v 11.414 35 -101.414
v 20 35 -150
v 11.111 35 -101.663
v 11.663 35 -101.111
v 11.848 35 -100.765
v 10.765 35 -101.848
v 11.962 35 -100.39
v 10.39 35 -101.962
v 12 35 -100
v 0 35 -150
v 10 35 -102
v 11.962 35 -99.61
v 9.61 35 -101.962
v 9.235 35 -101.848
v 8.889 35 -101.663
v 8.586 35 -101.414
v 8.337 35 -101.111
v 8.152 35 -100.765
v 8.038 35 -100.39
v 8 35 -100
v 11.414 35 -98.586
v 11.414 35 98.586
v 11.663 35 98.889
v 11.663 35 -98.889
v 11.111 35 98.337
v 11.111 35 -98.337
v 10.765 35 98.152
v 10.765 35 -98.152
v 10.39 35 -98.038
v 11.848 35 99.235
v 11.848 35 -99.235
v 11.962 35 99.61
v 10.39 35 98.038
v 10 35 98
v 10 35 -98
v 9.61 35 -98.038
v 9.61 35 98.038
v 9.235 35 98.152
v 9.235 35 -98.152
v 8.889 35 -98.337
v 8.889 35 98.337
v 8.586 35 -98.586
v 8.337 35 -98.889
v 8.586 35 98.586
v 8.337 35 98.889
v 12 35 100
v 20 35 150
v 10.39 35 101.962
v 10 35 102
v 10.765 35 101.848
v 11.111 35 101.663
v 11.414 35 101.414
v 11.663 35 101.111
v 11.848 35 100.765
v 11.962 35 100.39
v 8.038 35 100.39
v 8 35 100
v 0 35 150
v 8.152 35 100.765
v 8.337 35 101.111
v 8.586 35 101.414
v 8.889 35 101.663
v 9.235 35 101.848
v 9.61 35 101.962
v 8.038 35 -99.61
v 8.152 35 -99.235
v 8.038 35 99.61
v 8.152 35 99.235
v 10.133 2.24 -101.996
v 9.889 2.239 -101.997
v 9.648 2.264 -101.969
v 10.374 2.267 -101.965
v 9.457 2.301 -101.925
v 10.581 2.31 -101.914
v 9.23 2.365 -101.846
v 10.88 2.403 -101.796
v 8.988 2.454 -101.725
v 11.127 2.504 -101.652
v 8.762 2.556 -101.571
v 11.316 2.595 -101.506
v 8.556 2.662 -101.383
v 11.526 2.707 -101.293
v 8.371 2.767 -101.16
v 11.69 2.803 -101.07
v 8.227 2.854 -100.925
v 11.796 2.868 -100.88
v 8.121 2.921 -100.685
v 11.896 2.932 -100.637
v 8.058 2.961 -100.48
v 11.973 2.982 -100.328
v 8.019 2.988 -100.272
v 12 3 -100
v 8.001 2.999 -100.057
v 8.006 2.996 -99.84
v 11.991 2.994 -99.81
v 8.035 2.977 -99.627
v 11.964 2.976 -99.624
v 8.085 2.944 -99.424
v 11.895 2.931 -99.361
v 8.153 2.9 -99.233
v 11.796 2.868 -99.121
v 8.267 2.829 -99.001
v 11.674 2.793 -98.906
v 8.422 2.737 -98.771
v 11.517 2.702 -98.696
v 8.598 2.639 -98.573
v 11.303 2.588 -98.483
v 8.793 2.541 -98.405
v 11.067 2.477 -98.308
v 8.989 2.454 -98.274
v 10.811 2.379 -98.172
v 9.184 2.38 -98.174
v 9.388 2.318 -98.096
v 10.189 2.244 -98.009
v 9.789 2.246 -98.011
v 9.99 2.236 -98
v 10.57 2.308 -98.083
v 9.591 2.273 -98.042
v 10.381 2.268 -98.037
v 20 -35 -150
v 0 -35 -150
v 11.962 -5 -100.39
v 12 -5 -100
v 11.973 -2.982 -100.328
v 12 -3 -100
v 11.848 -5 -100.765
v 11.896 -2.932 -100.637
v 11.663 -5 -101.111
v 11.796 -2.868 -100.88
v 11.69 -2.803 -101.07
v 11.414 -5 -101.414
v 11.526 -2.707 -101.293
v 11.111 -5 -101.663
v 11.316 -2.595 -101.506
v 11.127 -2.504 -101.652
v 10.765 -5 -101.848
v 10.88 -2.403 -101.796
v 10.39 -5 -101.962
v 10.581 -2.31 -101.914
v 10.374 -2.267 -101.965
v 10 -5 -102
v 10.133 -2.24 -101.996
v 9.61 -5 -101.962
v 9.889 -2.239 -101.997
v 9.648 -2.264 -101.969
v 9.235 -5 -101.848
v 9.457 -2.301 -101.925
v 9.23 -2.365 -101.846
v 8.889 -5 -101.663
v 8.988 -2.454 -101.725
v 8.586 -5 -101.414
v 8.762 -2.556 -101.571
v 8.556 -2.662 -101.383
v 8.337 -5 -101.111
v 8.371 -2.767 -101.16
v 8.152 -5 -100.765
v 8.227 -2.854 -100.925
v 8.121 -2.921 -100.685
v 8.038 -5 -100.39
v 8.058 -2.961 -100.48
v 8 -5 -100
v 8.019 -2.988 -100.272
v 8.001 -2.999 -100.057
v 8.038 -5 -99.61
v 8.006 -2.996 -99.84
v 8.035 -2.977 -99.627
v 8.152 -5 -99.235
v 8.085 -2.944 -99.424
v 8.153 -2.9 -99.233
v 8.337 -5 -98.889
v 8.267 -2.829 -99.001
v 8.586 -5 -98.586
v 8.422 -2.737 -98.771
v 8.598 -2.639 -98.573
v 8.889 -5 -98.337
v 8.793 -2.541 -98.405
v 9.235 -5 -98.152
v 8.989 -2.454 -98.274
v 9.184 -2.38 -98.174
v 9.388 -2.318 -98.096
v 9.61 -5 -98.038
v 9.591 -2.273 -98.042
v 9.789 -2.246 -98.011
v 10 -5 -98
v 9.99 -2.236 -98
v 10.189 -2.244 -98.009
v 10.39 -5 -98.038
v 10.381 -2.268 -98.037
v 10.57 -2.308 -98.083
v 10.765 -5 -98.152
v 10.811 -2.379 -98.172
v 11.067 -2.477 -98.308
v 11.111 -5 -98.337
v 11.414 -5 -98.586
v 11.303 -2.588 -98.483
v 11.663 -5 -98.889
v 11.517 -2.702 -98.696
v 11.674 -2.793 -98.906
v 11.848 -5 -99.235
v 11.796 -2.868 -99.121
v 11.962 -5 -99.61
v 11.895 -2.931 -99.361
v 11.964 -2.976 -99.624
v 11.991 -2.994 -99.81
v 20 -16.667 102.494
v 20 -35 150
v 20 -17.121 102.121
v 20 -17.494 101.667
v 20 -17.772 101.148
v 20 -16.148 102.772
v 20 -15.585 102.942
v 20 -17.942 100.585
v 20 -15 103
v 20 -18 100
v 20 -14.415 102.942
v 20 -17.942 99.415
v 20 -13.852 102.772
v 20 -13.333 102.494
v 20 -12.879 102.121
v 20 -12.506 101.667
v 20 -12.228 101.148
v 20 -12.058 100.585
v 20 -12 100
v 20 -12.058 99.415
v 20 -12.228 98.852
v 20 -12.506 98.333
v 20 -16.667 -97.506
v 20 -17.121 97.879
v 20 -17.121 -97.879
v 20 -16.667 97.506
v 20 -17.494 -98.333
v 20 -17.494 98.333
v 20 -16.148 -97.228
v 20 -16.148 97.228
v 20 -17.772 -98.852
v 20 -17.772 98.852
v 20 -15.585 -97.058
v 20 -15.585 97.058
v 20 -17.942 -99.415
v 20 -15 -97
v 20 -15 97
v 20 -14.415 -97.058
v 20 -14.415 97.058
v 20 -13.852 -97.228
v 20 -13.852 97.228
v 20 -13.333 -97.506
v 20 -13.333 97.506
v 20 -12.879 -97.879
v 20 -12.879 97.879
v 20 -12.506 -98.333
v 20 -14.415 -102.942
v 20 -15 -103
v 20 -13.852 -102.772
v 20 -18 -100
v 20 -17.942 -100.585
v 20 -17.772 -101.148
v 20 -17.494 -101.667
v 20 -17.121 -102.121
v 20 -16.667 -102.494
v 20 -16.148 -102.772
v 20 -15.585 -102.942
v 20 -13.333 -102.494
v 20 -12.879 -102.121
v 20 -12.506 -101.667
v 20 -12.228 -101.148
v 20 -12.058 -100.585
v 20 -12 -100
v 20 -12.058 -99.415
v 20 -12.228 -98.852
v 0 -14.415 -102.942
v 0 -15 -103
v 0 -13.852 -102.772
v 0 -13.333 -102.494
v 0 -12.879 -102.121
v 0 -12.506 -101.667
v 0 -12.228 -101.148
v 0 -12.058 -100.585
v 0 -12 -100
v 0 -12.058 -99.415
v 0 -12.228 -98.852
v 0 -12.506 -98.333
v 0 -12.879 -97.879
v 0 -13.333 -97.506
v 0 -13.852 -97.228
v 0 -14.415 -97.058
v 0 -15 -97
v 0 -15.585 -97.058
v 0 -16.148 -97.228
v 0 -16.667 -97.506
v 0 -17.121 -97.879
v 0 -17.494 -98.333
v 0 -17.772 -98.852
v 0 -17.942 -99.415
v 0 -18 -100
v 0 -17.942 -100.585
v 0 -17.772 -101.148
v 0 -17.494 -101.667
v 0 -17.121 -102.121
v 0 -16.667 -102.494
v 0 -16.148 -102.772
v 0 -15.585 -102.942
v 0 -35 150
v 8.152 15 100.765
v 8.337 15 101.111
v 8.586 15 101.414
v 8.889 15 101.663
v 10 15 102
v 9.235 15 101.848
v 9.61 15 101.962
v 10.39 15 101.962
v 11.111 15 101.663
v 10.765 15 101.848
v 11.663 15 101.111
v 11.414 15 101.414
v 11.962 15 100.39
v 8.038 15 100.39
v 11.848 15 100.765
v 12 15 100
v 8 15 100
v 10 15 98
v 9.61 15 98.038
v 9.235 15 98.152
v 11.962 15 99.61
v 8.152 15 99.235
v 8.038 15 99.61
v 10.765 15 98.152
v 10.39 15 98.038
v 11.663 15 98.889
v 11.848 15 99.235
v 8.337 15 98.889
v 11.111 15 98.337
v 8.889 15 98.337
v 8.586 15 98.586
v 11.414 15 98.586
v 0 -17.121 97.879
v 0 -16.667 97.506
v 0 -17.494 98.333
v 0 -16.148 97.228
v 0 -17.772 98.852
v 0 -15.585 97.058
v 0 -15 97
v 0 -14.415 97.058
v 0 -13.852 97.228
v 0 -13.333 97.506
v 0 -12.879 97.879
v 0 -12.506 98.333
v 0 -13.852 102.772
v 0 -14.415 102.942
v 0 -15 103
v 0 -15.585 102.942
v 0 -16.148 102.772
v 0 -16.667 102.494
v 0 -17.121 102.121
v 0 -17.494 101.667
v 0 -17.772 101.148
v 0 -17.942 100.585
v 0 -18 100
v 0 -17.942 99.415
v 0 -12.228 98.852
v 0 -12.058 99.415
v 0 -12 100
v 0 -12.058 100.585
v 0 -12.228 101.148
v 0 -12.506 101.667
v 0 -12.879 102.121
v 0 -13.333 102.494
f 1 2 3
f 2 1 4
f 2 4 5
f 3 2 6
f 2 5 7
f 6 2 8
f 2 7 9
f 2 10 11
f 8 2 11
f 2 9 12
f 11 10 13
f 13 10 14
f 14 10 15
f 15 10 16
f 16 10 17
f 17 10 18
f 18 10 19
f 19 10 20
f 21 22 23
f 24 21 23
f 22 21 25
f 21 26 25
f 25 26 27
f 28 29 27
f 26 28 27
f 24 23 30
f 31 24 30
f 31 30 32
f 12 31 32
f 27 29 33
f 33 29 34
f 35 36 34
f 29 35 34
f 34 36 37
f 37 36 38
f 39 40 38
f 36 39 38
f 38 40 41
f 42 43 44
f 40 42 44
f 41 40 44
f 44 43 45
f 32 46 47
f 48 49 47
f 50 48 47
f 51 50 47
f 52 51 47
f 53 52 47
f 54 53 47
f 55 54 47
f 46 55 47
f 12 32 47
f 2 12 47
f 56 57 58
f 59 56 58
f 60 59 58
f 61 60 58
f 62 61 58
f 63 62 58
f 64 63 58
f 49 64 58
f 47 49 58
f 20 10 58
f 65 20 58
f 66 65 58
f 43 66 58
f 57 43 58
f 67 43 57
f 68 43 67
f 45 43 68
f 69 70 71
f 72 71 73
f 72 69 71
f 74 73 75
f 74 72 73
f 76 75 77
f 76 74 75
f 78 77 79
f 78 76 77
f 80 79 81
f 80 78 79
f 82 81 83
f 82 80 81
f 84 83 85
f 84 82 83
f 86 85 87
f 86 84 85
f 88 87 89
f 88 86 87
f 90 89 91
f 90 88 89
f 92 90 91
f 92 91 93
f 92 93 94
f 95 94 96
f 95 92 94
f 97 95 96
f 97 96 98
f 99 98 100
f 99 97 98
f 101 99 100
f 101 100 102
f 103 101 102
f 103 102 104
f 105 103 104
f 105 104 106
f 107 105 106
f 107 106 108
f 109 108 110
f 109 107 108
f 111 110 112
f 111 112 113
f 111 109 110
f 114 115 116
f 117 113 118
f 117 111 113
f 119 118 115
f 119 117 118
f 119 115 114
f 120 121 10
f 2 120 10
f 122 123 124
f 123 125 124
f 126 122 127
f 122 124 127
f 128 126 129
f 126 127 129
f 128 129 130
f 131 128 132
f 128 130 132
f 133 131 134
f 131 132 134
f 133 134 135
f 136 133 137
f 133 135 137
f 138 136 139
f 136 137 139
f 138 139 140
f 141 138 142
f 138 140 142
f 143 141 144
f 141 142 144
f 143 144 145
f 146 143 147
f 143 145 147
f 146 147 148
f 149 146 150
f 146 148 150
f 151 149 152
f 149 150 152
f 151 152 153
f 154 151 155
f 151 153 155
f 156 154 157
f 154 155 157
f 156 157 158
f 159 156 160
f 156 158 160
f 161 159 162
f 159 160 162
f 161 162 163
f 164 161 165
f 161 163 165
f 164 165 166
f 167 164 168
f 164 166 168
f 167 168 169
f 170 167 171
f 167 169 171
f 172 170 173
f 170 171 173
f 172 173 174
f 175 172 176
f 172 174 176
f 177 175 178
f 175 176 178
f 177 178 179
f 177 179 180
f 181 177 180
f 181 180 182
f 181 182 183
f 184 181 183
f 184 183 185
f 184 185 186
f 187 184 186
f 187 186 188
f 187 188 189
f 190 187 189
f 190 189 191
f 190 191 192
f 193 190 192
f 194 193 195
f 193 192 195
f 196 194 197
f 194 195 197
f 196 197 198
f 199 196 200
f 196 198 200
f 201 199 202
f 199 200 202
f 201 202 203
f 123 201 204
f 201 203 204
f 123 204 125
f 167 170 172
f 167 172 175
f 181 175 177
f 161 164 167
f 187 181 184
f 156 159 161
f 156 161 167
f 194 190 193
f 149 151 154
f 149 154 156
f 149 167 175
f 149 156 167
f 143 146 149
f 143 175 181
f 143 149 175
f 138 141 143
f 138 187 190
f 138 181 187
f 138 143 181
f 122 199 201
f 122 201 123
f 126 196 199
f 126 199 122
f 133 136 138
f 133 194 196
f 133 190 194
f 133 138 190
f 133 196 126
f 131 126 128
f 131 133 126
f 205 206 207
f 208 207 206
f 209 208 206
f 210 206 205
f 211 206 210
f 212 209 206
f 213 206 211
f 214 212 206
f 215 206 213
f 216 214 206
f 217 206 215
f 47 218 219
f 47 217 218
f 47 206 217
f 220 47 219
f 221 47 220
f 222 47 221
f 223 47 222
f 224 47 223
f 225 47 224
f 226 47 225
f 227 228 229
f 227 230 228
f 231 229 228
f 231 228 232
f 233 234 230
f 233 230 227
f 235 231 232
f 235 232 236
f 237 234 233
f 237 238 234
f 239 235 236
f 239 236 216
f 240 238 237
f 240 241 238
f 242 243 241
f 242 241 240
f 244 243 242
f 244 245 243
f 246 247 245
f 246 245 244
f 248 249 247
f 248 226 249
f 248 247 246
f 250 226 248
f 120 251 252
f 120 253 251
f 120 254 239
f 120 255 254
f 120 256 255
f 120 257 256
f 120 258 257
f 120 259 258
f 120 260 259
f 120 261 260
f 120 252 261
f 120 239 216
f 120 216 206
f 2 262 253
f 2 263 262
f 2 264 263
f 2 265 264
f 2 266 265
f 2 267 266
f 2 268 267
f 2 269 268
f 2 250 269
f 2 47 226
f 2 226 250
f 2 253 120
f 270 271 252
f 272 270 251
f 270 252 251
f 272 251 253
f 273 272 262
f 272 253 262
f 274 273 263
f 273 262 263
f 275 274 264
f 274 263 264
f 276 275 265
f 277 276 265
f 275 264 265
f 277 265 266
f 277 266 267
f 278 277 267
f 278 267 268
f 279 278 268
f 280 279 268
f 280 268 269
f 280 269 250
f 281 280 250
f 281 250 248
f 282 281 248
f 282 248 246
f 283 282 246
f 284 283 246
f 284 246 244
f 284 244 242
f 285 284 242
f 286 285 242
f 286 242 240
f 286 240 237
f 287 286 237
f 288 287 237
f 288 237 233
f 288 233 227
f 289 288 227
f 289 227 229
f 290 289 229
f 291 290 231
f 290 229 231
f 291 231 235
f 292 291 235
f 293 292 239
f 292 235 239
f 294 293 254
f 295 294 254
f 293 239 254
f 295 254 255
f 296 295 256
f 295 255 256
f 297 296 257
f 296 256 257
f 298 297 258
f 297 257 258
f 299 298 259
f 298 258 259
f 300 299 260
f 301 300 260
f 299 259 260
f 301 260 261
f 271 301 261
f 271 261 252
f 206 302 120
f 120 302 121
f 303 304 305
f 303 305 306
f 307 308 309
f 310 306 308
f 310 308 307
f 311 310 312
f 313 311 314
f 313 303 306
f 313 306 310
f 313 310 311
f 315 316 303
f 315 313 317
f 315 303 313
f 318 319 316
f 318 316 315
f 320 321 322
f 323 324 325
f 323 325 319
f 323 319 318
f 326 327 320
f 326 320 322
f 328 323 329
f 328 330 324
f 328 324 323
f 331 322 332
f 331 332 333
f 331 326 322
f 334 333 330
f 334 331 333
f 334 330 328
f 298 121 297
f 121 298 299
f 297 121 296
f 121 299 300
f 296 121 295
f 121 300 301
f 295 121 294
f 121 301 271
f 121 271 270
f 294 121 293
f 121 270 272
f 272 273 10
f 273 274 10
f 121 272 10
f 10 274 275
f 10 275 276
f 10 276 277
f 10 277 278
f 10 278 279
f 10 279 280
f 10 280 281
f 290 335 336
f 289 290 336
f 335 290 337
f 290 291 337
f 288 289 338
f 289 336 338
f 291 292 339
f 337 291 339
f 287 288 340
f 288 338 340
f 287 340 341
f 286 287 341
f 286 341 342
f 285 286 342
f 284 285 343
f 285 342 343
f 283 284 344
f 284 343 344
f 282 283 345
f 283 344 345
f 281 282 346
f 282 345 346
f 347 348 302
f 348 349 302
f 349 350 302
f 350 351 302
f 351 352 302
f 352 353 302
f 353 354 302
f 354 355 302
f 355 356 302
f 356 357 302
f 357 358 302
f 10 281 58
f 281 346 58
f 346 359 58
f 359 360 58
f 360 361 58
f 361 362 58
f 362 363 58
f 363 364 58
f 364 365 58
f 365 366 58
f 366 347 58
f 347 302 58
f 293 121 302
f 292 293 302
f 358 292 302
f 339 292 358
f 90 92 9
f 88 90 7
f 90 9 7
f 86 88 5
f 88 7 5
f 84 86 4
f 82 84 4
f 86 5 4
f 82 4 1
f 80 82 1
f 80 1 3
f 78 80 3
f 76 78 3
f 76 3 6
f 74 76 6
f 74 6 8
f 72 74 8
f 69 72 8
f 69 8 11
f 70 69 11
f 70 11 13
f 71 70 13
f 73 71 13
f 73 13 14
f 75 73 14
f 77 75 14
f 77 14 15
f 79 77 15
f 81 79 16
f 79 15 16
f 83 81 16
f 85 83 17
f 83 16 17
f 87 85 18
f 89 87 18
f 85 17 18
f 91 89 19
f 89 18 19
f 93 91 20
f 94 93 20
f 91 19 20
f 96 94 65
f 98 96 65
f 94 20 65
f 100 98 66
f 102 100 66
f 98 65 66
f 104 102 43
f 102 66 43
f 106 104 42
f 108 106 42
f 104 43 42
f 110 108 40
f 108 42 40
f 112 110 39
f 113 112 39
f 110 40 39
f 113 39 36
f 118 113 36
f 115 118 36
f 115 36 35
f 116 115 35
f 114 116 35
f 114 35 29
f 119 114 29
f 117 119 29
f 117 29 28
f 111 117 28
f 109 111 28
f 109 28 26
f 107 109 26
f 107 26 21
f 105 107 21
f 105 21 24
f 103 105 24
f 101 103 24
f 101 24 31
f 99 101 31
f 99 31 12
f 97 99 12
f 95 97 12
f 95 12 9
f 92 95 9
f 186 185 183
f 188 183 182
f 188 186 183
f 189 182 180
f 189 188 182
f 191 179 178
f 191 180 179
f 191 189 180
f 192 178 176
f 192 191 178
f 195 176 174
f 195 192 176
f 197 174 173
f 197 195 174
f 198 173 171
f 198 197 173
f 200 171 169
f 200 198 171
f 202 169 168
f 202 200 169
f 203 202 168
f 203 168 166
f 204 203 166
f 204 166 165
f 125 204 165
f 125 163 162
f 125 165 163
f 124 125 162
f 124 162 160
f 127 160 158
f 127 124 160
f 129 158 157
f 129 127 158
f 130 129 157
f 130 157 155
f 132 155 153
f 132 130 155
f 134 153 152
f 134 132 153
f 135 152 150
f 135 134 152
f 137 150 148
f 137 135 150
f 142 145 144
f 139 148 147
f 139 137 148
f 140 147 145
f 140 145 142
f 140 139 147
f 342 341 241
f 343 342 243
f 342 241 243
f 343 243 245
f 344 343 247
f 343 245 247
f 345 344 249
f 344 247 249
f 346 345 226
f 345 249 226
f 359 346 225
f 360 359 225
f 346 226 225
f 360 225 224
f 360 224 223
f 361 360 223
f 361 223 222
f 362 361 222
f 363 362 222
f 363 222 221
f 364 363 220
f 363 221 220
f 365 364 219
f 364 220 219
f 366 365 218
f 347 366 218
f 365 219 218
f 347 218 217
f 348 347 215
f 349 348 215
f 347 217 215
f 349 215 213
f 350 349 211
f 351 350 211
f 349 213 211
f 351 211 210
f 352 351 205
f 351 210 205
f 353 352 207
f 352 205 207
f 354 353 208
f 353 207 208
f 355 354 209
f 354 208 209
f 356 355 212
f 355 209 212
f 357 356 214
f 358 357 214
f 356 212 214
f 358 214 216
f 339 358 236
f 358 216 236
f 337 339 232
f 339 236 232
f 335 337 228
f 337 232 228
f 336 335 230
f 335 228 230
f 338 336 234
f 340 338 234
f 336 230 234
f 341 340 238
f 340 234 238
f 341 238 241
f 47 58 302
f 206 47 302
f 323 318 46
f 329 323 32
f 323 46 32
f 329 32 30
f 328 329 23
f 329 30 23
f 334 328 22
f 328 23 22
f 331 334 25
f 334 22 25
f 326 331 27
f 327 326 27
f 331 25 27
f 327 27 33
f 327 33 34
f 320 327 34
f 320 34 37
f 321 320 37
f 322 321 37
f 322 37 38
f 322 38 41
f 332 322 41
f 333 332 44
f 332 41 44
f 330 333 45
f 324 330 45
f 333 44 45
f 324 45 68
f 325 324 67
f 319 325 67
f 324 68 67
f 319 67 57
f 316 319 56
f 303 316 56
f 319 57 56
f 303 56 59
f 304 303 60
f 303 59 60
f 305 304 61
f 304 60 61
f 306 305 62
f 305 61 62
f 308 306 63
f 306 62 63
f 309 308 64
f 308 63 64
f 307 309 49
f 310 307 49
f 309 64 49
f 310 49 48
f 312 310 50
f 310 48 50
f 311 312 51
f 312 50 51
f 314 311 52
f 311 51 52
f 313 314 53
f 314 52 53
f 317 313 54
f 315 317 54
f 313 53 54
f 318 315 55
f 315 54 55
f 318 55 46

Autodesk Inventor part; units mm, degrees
ref_plane "YZ Plane" through (0, 0, 0) normal (1, 0, 0) x (0, 1, 0)
ref_plane "XZ Plane" through (0, 0, 0) normal (0, 1, 0) x (-1, 0, 0)
ref_plane "XY Plane" through (0, 0, 0) normal (0, 0, 1) x (1, 0, 0)
sketch "草图1" plane through (0, 0, 0) normal (1, 0, 0) x (0, 1, 0)
  line L0 (35, 150) -> (-35, 150)
  line L1 (-35, 150) -> (-35, -150)
  line L2 (-35, -150) -> (35, -150)
  line L3 (35, -150) -> (35, 150)
  point P0 (0, 0)
  dimension "d0" = 70
  dimension "d1" = 300
extrude "拉伸1" add sketch "草图1" along normal blind 20
sketch "草图2" plane through (0, 35, 150) normal (0, 1, 0) x (1, 0, 0)
  circle A0 centre (10, 50) radius 2
  point P0 (0, 150)
  dimension "d4" = 4
extrude "拉伸2" cut sketch "草图2" against normal blind 20
sketch "草图3" plane through (0, 35, 150) normal (0, 1, 0) x (1, 0, 0)
  circle A0 centre (10, 250) radius 2
  point P0 (0, 150)
  dimension "d7" = 4
extrude "拉伸3" cut sketch "草图3" against normal blind 40
sketch "草图4" plane through (20, 0, 0) normal (1, 0, 0) x (0, 0, -1)
  circle A0 centre (100, 0) radius 3
  point P0 (0, 0)
  dimension "d10" = 6
extrude "拉伸4" cut sketch "草图4" against normal through all
sketch "草图5" plane through (20, 0, 0) normal (1, 0, 0) x (0, 0, -1)
  circle A0 centre (-100, 0) radius 3
  point P0 (0, 0)
  dimension "d13" = 6
extrude "拉伸5" cut sketch "草图5" against normal through all
sketch "草图6" plane through (20, 0, 0) normal (1, 0, 0) x (0, 0, -1)
  circle A0 centre (-100, 0) radius 3 projected
  circle A1 centre (-100, 0) radius 3
  point P0 (0, 0)
  dimension "d16" = 6
extrude "拉伸6" add sketch "草图6" against normal blind 20
sketch "草图7" plane through (20, 0, 0) normal (1, 0, 0) x (0, 0, -1)
  circle A0 centre (100, 0) radius 3 projected
  circle A1 centre (100, 0) radius 3
  point P0 (0, 0)
  dimension "d19" = 6
extrude "拉伸7" add sketch "草图7" against normal blind 20
sketch "草图8" plane through (0, -35, -150) normal (0, -1, 0) x (1, 0, 0)
  line L0 (0, 300) -> (0, 0) projected
  line L1 (20, 300) -> (20, 0) projected
  line L2 (0, 300) -> (20, 300)
  line L3 (20, 300) -> (20, 0)
  line L4 (20, 0) -> (0, 0)
  line L5 (0, 0) -> (0, 300)
  point P0 (0, 150)
sketch "草图9" plane through (20, 0, 0) normal (1, 0, 0) x (0, 0, -1)
  circle A0 centre (-100, -15) radius 3
  point P0 (0, 0)
  dimension "d22" = 6
extrude "拉伸8" cut sketch "草图9" against normal through all
sketch "草图10" plane through (20, 0, 0) normal (1, 0, 0) x (0, 0, -1)
  circle A0 centre (100, -15) radius 3
  point P0 (0, 0)
  dimension "d25" = 6
extrude "拉伸9" cut sketch "草图10" against normal through all
sketch "草图11" plane through (20, 0, 0) normal (1, 0, 0) x (0, 0, -1)
  circle A0 centre (-100, -15) radius 3 projected
  circle A1 centre (-100, -15) radius 3
  point P0 (0, 0)
sketch "草图12" plane through (0, -35, -150) normal (0, -1, 0) x (1, 0, 0)
  point P0 (0, 150)
sketch "草图13" plane through (0, -35, -150) normal (0, -1, 0) x (1, 0, 0)
  point P0 (0, 150)
properties part number "马达安装版"
